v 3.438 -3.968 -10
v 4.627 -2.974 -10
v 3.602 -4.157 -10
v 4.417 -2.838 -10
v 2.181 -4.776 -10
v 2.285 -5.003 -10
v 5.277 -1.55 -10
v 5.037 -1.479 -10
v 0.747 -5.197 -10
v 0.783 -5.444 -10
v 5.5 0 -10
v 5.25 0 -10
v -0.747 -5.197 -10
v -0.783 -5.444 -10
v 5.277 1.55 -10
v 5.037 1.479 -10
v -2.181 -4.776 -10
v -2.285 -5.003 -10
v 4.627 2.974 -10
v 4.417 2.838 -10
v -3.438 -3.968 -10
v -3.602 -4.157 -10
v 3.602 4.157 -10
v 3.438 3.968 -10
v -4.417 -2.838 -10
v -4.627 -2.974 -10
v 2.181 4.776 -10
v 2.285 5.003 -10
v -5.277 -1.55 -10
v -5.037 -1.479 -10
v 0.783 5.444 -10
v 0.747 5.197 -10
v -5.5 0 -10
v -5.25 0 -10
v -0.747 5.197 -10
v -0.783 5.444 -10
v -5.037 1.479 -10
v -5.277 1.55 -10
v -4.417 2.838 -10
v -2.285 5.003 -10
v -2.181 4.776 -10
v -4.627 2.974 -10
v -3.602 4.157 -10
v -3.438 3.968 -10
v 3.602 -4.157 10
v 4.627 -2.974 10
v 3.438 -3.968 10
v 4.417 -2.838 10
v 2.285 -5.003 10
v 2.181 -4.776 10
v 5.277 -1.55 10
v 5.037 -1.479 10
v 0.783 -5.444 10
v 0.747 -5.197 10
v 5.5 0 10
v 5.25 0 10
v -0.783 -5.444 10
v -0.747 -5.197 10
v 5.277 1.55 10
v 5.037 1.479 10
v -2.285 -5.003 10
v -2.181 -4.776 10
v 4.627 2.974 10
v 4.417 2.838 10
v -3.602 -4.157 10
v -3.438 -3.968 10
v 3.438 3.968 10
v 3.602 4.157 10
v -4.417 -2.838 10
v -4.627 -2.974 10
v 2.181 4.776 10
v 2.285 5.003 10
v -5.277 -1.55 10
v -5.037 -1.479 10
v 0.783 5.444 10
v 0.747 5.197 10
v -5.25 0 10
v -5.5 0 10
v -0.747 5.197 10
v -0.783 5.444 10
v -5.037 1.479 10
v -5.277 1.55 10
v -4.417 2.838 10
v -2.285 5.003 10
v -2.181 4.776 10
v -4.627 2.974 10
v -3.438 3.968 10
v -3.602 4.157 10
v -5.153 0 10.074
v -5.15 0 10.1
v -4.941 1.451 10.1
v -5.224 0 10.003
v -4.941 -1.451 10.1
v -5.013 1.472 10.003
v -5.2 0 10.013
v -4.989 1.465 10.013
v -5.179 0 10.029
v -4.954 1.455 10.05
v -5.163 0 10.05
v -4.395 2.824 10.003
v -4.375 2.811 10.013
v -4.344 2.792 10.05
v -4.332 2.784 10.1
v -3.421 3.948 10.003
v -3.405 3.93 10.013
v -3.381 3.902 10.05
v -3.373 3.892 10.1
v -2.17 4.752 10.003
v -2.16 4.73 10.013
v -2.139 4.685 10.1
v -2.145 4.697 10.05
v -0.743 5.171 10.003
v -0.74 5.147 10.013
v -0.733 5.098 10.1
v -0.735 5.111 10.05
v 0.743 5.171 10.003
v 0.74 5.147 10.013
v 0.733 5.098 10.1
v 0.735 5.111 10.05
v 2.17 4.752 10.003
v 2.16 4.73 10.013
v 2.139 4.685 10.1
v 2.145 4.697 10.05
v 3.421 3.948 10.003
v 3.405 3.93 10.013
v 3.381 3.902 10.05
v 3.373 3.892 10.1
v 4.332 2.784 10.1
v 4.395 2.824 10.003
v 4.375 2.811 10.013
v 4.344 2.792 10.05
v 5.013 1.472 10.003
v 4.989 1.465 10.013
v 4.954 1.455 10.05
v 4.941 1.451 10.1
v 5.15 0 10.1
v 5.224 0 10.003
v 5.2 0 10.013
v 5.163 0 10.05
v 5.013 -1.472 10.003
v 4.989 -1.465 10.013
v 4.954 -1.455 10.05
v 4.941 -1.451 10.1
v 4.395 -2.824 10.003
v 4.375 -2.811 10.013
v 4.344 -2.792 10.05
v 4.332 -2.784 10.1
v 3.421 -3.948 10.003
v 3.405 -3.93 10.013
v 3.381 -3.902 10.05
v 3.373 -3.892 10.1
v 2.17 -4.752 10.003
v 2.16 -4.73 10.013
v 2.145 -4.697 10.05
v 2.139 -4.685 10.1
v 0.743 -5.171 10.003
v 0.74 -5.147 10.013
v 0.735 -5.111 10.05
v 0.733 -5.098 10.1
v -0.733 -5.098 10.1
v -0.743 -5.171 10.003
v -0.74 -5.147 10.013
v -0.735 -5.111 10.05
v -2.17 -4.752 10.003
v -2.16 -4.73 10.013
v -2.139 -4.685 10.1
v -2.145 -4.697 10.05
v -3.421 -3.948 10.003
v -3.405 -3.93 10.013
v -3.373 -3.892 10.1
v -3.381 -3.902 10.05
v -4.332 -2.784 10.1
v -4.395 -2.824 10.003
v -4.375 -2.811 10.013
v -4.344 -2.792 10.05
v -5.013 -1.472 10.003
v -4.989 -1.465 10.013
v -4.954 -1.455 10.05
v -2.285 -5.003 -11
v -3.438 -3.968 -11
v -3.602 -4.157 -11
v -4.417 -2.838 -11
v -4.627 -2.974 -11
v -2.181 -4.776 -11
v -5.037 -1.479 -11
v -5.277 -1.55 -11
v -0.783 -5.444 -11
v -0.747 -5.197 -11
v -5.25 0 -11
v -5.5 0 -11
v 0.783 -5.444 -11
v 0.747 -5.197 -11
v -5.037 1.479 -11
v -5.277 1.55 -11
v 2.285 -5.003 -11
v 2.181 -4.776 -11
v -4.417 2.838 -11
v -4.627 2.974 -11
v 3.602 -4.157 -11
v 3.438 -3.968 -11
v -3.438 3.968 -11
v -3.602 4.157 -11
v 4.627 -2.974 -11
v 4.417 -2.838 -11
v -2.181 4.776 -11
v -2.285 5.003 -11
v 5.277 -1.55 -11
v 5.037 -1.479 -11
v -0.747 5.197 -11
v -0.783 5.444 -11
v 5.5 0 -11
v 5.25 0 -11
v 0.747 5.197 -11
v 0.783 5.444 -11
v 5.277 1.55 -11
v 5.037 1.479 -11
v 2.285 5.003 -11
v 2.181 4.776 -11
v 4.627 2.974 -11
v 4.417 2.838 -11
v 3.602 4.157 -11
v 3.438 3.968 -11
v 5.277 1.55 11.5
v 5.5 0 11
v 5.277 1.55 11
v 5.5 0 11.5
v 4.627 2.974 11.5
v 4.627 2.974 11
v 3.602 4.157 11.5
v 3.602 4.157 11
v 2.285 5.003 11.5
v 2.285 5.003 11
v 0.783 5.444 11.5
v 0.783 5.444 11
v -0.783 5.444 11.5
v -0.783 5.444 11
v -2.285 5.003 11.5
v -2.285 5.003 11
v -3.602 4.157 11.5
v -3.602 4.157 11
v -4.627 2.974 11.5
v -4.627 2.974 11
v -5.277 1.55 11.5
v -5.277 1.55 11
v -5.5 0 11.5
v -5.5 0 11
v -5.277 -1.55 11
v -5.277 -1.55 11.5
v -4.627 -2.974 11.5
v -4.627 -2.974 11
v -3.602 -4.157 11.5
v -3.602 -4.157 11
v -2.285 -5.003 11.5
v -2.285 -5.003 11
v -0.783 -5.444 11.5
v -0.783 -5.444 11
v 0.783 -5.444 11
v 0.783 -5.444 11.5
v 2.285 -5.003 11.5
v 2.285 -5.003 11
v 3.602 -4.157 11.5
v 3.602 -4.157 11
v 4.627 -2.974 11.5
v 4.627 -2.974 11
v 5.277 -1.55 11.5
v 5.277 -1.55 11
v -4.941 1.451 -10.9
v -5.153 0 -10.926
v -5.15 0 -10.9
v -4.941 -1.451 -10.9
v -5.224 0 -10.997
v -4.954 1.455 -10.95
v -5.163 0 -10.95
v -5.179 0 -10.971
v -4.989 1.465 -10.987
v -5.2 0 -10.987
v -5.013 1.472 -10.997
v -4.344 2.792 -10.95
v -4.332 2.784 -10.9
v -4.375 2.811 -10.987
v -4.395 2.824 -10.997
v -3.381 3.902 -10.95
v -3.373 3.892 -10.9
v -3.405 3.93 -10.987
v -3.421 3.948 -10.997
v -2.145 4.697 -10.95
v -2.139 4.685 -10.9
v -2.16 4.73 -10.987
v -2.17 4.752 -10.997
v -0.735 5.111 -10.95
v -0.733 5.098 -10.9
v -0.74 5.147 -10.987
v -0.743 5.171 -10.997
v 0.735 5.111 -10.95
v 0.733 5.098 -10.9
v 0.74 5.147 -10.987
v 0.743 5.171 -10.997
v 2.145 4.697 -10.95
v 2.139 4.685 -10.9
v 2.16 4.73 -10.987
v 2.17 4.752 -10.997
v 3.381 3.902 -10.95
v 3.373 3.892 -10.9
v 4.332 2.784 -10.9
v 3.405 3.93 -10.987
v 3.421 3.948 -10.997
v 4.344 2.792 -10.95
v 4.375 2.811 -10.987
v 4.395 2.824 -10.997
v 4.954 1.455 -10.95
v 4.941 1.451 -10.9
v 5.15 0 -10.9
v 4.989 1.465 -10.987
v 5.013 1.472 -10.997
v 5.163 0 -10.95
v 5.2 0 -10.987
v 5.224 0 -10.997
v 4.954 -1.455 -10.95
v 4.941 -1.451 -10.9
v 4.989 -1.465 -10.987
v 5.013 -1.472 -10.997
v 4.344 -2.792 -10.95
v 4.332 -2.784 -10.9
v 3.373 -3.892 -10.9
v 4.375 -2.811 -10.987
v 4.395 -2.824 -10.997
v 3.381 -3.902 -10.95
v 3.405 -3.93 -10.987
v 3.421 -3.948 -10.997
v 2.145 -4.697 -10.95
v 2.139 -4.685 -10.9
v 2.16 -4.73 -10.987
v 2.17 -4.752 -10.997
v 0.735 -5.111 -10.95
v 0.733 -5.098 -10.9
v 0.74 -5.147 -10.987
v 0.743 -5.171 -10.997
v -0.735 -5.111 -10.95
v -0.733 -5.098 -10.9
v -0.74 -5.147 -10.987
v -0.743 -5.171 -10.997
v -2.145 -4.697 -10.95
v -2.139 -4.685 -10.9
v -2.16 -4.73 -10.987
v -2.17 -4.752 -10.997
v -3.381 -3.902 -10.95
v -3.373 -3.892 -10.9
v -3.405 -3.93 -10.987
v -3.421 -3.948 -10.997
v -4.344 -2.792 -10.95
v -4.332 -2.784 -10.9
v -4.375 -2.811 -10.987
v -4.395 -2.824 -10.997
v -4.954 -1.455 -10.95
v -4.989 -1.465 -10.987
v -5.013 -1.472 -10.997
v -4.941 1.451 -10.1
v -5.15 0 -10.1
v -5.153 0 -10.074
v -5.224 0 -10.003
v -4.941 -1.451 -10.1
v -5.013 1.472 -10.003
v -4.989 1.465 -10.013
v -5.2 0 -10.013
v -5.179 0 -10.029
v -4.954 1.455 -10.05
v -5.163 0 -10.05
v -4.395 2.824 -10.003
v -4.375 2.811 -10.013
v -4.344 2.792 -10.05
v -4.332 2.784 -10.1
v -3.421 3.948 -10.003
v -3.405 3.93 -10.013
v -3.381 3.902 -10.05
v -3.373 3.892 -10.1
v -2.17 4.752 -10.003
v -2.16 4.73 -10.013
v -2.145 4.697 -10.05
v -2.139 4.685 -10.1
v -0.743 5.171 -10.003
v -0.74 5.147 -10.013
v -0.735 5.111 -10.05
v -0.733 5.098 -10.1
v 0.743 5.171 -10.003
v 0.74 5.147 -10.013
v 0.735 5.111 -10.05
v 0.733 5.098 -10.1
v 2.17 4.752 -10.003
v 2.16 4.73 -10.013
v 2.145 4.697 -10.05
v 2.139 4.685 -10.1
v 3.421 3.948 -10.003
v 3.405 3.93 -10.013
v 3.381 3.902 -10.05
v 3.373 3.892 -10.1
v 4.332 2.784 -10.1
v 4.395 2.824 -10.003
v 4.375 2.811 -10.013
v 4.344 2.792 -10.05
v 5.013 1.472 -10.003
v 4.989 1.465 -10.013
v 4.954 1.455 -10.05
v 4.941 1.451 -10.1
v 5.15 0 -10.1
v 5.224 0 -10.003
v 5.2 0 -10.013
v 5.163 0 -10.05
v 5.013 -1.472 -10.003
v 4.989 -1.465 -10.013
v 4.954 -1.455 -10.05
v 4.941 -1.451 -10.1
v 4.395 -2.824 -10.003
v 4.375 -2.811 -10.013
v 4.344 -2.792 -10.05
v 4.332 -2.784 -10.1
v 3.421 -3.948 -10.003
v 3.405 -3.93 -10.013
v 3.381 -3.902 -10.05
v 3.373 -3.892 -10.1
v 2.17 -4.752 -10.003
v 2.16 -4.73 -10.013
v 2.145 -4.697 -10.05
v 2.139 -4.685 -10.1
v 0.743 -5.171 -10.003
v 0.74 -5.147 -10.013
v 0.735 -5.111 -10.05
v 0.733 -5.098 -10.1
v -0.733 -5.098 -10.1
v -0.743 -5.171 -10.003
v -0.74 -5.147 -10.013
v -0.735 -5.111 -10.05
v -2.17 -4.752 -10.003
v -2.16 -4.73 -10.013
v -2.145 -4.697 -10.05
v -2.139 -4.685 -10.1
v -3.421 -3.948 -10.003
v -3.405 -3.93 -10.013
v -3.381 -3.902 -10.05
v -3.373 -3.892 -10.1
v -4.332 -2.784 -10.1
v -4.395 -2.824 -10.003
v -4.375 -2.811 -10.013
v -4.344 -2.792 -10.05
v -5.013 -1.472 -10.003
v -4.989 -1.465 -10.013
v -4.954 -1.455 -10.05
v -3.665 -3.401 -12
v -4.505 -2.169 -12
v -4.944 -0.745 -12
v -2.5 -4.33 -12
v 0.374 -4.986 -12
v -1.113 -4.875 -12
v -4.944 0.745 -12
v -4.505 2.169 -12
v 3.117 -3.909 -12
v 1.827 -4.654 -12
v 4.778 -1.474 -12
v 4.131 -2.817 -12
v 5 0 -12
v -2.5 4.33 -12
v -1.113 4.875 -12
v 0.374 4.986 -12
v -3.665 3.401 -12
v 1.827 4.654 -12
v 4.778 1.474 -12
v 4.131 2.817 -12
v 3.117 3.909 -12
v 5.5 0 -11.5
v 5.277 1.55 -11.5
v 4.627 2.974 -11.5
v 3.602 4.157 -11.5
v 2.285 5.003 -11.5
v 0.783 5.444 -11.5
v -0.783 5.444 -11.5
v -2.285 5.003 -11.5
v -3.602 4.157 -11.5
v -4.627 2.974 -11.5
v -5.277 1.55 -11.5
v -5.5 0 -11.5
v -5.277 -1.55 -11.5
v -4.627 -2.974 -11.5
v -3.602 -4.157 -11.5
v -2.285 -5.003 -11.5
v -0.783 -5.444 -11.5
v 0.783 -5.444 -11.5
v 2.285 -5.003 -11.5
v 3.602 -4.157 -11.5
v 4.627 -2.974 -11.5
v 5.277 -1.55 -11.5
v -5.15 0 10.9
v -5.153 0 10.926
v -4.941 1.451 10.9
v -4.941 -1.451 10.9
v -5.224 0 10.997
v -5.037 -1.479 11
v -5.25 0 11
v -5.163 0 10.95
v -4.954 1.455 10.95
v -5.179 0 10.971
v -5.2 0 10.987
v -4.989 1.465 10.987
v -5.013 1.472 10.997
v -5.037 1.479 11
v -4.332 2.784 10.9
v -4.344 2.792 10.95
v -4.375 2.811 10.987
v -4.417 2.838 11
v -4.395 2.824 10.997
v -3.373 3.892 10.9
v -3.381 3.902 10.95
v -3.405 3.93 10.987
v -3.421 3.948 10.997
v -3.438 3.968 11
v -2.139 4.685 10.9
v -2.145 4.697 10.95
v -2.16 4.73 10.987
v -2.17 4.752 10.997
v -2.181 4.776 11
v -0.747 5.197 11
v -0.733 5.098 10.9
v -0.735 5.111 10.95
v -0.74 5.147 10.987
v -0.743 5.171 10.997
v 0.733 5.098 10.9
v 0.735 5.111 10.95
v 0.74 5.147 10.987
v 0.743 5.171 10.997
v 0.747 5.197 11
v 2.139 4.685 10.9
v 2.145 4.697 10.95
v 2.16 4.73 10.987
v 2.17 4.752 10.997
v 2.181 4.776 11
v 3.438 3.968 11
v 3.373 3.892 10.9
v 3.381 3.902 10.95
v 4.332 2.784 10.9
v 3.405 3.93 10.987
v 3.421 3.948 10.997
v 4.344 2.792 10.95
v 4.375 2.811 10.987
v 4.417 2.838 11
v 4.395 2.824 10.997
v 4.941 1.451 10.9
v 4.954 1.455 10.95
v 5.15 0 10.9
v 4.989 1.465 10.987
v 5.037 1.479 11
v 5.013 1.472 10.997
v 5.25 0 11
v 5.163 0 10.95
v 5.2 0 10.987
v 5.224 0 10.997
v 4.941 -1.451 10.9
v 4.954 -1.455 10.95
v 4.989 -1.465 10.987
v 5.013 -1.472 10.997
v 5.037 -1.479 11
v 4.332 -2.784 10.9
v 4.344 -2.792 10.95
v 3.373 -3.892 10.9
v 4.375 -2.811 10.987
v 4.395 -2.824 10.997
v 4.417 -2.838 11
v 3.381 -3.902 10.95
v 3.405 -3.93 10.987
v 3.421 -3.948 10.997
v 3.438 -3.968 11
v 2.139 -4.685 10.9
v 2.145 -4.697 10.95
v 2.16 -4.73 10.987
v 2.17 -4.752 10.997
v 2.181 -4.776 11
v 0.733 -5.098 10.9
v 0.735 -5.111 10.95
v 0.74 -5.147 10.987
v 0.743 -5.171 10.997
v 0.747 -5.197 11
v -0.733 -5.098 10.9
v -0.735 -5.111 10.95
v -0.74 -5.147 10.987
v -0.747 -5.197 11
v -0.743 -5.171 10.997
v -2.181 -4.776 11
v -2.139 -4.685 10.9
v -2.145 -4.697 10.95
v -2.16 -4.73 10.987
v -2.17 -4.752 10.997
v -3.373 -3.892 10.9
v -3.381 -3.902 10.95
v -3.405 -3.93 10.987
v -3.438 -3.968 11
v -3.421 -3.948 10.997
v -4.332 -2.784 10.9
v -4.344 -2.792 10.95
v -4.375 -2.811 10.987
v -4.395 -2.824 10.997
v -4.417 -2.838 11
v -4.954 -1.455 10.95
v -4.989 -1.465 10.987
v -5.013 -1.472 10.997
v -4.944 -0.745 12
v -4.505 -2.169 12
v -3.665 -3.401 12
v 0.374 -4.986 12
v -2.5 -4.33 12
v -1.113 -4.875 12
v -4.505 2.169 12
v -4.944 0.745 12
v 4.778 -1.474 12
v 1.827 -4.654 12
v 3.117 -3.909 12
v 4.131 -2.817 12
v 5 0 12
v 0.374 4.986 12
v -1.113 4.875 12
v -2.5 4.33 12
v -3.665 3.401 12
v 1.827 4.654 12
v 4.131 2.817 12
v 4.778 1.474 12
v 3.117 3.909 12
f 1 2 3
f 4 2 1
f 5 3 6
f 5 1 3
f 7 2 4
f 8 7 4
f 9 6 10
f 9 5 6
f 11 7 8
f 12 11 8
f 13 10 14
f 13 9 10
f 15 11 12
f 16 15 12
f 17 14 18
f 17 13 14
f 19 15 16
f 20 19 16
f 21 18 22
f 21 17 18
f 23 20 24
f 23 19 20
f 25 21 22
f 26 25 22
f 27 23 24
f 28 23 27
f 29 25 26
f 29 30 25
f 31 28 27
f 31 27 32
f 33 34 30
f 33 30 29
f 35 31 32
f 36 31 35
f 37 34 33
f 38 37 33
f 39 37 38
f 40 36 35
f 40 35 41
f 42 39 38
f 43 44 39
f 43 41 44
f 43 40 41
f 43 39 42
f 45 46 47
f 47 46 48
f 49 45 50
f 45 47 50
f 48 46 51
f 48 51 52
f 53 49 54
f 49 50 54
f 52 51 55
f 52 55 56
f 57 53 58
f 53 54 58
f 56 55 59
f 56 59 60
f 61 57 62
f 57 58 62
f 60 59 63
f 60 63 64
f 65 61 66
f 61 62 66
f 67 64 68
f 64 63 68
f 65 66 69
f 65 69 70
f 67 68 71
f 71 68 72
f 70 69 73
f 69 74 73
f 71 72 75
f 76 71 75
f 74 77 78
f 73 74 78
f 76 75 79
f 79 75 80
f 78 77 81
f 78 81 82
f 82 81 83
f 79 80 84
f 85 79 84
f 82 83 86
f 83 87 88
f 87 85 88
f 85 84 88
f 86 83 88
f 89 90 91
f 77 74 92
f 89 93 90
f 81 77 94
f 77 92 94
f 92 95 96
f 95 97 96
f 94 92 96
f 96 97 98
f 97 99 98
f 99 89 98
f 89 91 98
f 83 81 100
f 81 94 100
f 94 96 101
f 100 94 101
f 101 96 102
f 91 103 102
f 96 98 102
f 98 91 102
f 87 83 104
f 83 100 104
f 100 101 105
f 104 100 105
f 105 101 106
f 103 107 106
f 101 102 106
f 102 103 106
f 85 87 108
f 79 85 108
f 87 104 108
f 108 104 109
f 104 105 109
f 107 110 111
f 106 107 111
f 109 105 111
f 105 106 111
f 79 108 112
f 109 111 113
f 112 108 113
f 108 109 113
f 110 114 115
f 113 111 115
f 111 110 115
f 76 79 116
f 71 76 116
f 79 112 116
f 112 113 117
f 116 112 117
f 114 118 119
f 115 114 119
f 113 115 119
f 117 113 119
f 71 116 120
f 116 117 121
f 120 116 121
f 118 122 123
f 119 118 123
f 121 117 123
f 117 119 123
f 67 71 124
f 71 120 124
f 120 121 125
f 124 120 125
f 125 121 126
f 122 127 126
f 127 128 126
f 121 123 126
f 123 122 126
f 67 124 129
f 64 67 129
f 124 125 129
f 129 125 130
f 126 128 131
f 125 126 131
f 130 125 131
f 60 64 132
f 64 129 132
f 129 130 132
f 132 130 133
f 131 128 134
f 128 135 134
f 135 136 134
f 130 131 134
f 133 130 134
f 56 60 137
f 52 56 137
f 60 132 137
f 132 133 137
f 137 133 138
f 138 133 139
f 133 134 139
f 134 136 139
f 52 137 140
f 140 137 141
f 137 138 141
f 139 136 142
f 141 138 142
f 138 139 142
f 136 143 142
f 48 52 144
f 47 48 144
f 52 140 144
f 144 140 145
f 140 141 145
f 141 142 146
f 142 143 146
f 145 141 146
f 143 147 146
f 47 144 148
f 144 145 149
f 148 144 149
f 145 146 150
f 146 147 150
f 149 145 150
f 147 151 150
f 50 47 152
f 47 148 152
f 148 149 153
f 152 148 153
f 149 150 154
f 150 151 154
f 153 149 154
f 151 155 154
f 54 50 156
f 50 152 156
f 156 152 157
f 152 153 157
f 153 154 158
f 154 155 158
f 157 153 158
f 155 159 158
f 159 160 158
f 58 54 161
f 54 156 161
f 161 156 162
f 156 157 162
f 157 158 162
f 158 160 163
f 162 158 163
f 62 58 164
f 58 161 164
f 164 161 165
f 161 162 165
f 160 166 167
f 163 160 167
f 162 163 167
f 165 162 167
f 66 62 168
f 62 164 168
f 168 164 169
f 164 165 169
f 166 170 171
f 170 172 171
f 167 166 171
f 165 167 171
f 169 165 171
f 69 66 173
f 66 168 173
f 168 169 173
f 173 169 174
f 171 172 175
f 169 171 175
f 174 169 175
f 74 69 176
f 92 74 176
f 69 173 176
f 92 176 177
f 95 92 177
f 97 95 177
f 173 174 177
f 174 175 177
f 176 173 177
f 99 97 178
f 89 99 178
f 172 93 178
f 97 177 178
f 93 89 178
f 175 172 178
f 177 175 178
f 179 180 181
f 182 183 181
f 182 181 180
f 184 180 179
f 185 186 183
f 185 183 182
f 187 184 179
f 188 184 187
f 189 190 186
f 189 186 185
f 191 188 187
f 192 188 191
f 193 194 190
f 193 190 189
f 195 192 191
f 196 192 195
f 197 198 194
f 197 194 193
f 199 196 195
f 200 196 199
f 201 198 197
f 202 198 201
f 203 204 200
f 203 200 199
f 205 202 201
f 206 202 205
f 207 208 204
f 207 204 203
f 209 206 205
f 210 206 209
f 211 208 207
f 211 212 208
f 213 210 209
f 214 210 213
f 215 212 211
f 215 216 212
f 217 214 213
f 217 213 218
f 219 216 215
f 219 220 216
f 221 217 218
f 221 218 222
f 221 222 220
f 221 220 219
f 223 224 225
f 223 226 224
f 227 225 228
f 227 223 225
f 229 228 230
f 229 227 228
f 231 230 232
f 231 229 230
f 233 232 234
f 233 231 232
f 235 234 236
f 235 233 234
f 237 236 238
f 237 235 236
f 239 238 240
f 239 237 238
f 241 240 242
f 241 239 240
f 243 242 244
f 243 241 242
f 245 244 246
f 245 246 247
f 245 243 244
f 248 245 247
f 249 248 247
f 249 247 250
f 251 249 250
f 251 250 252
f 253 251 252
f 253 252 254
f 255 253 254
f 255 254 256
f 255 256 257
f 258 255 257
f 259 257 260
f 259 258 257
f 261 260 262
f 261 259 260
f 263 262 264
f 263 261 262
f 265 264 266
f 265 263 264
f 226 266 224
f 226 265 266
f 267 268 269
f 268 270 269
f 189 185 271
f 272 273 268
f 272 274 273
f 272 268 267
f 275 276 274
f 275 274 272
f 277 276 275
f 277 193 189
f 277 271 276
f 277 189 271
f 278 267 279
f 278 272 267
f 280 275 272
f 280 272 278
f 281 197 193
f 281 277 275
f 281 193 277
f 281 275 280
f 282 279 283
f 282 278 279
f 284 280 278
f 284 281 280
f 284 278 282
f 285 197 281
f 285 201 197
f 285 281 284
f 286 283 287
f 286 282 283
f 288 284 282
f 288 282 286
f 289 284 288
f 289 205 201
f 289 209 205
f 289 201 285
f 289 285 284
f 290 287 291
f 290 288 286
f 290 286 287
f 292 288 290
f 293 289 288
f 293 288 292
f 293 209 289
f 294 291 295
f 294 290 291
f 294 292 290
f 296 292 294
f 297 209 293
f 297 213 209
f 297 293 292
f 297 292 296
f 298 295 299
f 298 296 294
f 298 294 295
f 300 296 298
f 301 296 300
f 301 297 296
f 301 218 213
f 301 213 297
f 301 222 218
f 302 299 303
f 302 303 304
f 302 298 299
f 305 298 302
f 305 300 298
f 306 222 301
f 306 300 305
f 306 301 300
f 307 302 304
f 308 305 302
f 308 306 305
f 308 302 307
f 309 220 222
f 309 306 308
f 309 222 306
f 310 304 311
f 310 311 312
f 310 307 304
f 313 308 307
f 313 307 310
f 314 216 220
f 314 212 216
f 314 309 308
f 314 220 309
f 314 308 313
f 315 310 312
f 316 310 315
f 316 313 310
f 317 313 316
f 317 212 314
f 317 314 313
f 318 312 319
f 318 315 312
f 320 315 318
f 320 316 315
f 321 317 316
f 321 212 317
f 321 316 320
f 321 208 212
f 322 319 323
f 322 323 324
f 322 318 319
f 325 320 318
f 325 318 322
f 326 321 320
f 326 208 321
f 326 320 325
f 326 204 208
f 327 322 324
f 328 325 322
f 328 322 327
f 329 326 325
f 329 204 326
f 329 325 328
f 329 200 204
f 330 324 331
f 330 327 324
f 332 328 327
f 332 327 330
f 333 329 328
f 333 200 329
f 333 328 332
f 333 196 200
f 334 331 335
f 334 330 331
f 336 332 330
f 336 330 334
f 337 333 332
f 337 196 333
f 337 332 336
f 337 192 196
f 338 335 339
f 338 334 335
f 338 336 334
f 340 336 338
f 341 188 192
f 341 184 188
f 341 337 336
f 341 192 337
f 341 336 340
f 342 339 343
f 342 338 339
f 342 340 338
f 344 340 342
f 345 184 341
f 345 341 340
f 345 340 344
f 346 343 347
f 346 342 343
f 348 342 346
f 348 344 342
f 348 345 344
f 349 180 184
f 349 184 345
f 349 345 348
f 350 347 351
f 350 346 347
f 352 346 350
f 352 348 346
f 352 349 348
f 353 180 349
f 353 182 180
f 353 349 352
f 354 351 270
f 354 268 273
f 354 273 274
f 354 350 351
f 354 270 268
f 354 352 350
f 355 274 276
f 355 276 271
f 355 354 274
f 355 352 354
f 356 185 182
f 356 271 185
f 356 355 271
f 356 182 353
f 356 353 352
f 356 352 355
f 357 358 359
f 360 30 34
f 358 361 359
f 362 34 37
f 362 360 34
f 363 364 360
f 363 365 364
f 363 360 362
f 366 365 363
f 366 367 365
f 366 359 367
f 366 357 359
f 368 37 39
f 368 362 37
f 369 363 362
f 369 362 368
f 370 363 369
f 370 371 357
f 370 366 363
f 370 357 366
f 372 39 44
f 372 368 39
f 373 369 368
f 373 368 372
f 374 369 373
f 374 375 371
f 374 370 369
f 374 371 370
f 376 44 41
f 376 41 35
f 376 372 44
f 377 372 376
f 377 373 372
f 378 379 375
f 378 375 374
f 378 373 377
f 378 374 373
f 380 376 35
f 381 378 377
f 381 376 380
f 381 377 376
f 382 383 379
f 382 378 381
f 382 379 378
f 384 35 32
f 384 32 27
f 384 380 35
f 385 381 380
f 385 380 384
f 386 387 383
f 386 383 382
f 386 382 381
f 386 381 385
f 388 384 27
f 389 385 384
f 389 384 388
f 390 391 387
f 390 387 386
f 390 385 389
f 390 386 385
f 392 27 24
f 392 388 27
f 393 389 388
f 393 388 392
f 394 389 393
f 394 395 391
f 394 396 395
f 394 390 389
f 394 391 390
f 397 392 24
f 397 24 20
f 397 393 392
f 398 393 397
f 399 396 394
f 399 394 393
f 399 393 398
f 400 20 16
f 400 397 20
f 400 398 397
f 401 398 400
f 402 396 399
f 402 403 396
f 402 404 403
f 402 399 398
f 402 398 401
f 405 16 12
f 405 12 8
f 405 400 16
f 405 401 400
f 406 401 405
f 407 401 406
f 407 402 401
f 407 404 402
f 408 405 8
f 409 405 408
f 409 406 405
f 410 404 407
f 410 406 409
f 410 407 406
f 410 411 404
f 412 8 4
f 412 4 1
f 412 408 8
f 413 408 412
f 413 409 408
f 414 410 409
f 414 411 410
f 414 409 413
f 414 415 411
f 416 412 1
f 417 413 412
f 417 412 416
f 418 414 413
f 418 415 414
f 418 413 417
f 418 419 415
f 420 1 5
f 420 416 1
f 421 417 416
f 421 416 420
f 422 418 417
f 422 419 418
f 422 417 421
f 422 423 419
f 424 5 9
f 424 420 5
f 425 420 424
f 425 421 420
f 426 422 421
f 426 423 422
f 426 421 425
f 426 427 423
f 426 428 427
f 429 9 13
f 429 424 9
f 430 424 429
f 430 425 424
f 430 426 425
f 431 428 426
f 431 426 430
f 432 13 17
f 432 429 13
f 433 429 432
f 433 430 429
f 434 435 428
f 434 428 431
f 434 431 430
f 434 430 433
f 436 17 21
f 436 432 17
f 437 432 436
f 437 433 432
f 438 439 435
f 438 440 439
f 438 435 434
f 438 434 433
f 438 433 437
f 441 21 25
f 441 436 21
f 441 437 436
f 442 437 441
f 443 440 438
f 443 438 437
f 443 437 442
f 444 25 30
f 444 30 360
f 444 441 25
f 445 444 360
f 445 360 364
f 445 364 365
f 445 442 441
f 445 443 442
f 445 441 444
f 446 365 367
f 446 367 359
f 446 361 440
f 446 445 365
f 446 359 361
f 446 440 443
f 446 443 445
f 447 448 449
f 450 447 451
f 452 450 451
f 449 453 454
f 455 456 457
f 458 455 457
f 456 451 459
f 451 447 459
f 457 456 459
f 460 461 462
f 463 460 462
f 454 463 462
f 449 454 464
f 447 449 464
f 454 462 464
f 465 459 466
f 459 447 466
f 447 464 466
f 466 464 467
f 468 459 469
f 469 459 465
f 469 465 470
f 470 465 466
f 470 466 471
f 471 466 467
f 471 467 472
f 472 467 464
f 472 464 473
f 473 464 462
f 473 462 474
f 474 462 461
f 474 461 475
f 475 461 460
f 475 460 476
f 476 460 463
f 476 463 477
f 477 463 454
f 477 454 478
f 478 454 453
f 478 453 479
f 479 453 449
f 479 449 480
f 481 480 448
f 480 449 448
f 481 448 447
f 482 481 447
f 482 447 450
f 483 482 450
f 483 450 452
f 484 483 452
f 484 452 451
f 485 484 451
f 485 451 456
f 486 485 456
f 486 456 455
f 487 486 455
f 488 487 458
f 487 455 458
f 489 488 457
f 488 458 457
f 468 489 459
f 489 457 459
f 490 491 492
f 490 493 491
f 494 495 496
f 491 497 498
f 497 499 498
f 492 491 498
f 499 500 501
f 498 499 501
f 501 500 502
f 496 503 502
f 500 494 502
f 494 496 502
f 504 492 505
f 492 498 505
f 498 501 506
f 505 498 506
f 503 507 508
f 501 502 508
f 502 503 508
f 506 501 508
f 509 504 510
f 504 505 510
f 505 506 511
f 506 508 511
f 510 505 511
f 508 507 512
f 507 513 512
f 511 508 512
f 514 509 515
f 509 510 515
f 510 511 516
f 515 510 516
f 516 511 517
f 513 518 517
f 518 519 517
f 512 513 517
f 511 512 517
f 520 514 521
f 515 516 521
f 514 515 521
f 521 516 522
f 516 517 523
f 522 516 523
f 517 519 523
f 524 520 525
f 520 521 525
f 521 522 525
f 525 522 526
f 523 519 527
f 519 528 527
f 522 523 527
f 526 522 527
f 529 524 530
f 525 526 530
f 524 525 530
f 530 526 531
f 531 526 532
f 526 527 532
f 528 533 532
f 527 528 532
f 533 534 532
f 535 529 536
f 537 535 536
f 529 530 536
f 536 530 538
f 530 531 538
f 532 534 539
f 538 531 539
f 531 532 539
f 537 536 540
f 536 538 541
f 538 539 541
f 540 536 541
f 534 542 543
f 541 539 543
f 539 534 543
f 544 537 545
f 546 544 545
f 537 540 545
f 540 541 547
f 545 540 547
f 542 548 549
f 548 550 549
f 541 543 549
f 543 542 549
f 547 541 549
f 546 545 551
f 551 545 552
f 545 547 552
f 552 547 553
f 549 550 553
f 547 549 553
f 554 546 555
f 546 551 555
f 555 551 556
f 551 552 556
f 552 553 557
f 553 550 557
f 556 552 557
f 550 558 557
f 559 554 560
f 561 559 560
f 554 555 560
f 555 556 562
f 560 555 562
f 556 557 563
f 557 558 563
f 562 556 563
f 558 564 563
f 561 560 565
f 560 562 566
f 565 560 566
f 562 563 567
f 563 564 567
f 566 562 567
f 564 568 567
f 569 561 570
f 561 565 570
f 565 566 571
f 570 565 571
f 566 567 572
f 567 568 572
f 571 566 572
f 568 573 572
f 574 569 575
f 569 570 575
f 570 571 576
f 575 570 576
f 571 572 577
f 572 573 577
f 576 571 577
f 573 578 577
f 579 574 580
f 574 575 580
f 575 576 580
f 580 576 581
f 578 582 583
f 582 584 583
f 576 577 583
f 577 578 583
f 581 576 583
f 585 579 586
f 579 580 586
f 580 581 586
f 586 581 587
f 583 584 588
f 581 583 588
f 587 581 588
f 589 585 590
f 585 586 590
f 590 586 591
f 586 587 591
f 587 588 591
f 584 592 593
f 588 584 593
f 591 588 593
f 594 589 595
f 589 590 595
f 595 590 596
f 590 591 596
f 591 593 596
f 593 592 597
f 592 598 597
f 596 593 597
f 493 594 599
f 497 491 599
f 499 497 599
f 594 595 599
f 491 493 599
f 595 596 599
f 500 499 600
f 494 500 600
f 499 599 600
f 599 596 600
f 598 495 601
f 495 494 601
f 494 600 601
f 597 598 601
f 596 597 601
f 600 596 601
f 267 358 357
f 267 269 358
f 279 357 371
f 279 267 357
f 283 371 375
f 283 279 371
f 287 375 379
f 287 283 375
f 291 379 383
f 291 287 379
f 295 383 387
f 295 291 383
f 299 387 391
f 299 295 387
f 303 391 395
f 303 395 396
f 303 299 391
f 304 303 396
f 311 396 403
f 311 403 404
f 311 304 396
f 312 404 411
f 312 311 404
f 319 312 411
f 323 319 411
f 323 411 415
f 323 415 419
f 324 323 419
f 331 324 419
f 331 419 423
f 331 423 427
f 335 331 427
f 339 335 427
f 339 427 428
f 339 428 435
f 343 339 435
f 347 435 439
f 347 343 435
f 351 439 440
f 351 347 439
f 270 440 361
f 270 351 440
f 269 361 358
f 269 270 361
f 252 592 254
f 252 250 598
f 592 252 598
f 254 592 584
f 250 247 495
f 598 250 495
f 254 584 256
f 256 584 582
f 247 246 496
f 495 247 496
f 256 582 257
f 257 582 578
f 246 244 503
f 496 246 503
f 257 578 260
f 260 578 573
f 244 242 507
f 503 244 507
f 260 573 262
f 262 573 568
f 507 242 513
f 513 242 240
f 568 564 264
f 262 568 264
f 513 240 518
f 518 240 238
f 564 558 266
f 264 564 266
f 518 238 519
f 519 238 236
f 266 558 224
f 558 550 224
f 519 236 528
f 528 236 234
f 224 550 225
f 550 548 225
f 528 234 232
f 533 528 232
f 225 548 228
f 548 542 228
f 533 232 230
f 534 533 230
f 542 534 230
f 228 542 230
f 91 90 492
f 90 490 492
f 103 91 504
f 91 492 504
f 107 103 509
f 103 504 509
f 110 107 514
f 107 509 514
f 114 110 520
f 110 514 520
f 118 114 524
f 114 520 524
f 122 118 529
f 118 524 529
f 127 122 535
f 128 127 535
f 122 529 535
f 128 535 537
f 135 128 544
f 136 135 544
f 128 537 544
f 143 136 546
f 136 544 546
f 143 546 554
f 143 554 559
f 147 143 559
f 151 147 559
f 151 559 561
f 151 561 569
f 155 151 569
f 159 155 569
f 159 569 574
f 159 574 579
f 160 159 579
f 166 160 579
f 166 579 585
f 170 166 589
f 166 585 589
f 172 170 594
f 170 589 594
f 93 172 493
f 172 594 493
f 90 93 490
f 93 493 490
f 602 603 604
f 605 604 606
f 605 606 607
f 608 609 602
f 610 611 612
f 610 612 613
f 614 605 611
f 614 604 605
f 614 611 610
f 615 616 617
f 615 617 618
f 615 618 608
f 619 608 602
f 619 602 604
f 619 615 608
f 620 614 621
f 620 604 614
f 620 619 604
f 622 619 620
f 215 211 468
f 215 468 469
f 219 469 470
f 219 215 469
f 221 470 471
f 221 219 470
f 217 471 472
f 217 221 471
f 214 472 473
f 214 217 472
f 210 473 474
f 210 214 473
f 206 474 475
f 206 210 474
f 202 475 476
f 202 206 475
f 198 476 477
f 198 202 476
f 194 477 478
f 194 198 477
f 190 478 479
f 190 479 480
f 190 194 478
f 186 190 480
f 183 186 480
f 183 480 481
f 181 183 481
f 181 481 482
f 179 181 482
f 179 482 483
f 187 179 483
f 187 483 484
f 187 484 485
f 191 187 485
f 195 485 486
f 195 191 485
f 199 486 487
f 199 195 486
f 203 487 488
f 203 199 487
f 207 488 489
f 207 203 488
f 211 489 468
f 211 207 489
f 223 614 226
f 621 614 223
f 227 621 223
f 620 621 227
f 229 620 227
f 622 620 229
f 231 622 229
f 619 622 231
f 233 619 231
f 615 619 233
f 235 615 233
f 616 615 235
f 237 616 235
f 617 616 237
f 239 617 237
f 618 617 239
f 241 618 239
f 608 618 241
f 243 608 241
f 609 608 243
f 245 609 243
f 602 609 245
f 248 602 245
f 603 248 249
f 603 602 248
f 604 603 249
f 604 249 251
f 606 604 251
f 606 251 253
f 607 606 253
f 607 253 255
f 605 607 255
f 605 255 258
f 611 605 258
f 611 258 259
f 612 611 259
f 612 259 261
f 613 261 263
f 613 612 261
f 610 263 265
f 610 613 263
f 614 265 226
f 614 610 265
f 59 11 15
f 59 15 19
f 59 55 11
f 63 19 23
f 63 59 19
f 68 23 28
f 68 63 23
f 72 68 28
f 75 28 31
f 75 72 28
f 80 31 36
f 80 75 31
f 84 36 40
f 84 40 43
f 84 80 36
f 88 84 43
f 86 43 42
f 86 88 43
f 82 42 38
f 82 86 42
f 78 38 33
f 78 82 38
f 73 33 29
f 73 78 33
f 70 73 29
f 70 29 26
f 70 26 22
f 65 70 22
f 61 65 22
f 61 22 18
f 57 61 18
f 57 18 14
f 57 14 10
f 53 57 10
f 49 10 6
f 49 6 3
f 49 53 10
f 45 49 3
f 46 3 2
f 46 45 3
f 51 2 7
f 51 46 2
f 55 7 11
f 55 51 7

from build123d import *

# Parameters (mm, degrees)
ESQUISSE1_R      = 5.5
EXTRUSION1_DEPTH = 12
CHANFREIN1_SIZE  = 0.5
CHANFREIN2_SIZE  = 0.5


with BuildPart() as part:
    # Esquisse1 → Extrusion1 (new, symmetric)
    with BuildSketch(Plane.XY):
        Circle(ESQUISSE1_R)
    extrude(amount=EXTRUSION1_DEPTH, both=True)

    # Chanfrein1
    chanfrein1_edges = [part.edges().sort_by_distance(p)[0] for p in [
        (-5.5, 0, 12),
    ]]
    chamfer(chanfrein1_edges, length=CHANFREIN1_SIZE)

    # Chanfrein2
    chanfrein2_edges = [part.edges().sort_by_distance(p)[0] for p in [
        (-5.5, 0, -12),
    ]]
    chamfer(chanfrein2_edges, length=CHANFREIN2_SIZE)

    # Esquisse3 → Gorge pour ANSI B27.8M - 3DM1-11, Circlip haut rendement1 (revolve, cut)
    with BuildSketch(Plane(origin=(0, 0, 24), x_dir=(0, 1, 0), z_dir=(-1, 0, 0)), mode=Mode.PRIVATE) as gorge_pour_ansi_b27_8m_3dm1_11_circli_sk:
        with BuildLine():
            Line((5.25, 13), (6.6, 13))
            Line((6.6, 13), (6.6, 14))
            Line((6.6, 14), (5.25, 14))
            ThreePointArc((5.25, 14), (5.179289322, 13.970710678), (5.15, 13.9))
            Line((5.15, 13.9), (5.15, 13.1))
            ThreePointArc((5.15, 13.1), (5.179289322, 13.029289322), (5.25, 13))
        make_face()
    gorge_pour_ansi_b27_8m_3dm1_11_circli = revolve(gorge_pour_ansi_b27_8m_3dm1_11_circli_sk.sketch.rotate(Axis((0, 0, 74), (0, 0, -1)), 270), axis=Axis((0, 0, 74), (0, 0, -1)), mode=Mode.SUBTRACT)

    # Symétrie1: Gorge pour ANSI B27.8M - 3DM1-11, Circlip haut rendement1 across plane
    add(gorge_pour_ansi_b27_8m_3dm1_11_circli.mirror(Plane.XY), mode=Mode.SUBTRACT)


solid = part.part
